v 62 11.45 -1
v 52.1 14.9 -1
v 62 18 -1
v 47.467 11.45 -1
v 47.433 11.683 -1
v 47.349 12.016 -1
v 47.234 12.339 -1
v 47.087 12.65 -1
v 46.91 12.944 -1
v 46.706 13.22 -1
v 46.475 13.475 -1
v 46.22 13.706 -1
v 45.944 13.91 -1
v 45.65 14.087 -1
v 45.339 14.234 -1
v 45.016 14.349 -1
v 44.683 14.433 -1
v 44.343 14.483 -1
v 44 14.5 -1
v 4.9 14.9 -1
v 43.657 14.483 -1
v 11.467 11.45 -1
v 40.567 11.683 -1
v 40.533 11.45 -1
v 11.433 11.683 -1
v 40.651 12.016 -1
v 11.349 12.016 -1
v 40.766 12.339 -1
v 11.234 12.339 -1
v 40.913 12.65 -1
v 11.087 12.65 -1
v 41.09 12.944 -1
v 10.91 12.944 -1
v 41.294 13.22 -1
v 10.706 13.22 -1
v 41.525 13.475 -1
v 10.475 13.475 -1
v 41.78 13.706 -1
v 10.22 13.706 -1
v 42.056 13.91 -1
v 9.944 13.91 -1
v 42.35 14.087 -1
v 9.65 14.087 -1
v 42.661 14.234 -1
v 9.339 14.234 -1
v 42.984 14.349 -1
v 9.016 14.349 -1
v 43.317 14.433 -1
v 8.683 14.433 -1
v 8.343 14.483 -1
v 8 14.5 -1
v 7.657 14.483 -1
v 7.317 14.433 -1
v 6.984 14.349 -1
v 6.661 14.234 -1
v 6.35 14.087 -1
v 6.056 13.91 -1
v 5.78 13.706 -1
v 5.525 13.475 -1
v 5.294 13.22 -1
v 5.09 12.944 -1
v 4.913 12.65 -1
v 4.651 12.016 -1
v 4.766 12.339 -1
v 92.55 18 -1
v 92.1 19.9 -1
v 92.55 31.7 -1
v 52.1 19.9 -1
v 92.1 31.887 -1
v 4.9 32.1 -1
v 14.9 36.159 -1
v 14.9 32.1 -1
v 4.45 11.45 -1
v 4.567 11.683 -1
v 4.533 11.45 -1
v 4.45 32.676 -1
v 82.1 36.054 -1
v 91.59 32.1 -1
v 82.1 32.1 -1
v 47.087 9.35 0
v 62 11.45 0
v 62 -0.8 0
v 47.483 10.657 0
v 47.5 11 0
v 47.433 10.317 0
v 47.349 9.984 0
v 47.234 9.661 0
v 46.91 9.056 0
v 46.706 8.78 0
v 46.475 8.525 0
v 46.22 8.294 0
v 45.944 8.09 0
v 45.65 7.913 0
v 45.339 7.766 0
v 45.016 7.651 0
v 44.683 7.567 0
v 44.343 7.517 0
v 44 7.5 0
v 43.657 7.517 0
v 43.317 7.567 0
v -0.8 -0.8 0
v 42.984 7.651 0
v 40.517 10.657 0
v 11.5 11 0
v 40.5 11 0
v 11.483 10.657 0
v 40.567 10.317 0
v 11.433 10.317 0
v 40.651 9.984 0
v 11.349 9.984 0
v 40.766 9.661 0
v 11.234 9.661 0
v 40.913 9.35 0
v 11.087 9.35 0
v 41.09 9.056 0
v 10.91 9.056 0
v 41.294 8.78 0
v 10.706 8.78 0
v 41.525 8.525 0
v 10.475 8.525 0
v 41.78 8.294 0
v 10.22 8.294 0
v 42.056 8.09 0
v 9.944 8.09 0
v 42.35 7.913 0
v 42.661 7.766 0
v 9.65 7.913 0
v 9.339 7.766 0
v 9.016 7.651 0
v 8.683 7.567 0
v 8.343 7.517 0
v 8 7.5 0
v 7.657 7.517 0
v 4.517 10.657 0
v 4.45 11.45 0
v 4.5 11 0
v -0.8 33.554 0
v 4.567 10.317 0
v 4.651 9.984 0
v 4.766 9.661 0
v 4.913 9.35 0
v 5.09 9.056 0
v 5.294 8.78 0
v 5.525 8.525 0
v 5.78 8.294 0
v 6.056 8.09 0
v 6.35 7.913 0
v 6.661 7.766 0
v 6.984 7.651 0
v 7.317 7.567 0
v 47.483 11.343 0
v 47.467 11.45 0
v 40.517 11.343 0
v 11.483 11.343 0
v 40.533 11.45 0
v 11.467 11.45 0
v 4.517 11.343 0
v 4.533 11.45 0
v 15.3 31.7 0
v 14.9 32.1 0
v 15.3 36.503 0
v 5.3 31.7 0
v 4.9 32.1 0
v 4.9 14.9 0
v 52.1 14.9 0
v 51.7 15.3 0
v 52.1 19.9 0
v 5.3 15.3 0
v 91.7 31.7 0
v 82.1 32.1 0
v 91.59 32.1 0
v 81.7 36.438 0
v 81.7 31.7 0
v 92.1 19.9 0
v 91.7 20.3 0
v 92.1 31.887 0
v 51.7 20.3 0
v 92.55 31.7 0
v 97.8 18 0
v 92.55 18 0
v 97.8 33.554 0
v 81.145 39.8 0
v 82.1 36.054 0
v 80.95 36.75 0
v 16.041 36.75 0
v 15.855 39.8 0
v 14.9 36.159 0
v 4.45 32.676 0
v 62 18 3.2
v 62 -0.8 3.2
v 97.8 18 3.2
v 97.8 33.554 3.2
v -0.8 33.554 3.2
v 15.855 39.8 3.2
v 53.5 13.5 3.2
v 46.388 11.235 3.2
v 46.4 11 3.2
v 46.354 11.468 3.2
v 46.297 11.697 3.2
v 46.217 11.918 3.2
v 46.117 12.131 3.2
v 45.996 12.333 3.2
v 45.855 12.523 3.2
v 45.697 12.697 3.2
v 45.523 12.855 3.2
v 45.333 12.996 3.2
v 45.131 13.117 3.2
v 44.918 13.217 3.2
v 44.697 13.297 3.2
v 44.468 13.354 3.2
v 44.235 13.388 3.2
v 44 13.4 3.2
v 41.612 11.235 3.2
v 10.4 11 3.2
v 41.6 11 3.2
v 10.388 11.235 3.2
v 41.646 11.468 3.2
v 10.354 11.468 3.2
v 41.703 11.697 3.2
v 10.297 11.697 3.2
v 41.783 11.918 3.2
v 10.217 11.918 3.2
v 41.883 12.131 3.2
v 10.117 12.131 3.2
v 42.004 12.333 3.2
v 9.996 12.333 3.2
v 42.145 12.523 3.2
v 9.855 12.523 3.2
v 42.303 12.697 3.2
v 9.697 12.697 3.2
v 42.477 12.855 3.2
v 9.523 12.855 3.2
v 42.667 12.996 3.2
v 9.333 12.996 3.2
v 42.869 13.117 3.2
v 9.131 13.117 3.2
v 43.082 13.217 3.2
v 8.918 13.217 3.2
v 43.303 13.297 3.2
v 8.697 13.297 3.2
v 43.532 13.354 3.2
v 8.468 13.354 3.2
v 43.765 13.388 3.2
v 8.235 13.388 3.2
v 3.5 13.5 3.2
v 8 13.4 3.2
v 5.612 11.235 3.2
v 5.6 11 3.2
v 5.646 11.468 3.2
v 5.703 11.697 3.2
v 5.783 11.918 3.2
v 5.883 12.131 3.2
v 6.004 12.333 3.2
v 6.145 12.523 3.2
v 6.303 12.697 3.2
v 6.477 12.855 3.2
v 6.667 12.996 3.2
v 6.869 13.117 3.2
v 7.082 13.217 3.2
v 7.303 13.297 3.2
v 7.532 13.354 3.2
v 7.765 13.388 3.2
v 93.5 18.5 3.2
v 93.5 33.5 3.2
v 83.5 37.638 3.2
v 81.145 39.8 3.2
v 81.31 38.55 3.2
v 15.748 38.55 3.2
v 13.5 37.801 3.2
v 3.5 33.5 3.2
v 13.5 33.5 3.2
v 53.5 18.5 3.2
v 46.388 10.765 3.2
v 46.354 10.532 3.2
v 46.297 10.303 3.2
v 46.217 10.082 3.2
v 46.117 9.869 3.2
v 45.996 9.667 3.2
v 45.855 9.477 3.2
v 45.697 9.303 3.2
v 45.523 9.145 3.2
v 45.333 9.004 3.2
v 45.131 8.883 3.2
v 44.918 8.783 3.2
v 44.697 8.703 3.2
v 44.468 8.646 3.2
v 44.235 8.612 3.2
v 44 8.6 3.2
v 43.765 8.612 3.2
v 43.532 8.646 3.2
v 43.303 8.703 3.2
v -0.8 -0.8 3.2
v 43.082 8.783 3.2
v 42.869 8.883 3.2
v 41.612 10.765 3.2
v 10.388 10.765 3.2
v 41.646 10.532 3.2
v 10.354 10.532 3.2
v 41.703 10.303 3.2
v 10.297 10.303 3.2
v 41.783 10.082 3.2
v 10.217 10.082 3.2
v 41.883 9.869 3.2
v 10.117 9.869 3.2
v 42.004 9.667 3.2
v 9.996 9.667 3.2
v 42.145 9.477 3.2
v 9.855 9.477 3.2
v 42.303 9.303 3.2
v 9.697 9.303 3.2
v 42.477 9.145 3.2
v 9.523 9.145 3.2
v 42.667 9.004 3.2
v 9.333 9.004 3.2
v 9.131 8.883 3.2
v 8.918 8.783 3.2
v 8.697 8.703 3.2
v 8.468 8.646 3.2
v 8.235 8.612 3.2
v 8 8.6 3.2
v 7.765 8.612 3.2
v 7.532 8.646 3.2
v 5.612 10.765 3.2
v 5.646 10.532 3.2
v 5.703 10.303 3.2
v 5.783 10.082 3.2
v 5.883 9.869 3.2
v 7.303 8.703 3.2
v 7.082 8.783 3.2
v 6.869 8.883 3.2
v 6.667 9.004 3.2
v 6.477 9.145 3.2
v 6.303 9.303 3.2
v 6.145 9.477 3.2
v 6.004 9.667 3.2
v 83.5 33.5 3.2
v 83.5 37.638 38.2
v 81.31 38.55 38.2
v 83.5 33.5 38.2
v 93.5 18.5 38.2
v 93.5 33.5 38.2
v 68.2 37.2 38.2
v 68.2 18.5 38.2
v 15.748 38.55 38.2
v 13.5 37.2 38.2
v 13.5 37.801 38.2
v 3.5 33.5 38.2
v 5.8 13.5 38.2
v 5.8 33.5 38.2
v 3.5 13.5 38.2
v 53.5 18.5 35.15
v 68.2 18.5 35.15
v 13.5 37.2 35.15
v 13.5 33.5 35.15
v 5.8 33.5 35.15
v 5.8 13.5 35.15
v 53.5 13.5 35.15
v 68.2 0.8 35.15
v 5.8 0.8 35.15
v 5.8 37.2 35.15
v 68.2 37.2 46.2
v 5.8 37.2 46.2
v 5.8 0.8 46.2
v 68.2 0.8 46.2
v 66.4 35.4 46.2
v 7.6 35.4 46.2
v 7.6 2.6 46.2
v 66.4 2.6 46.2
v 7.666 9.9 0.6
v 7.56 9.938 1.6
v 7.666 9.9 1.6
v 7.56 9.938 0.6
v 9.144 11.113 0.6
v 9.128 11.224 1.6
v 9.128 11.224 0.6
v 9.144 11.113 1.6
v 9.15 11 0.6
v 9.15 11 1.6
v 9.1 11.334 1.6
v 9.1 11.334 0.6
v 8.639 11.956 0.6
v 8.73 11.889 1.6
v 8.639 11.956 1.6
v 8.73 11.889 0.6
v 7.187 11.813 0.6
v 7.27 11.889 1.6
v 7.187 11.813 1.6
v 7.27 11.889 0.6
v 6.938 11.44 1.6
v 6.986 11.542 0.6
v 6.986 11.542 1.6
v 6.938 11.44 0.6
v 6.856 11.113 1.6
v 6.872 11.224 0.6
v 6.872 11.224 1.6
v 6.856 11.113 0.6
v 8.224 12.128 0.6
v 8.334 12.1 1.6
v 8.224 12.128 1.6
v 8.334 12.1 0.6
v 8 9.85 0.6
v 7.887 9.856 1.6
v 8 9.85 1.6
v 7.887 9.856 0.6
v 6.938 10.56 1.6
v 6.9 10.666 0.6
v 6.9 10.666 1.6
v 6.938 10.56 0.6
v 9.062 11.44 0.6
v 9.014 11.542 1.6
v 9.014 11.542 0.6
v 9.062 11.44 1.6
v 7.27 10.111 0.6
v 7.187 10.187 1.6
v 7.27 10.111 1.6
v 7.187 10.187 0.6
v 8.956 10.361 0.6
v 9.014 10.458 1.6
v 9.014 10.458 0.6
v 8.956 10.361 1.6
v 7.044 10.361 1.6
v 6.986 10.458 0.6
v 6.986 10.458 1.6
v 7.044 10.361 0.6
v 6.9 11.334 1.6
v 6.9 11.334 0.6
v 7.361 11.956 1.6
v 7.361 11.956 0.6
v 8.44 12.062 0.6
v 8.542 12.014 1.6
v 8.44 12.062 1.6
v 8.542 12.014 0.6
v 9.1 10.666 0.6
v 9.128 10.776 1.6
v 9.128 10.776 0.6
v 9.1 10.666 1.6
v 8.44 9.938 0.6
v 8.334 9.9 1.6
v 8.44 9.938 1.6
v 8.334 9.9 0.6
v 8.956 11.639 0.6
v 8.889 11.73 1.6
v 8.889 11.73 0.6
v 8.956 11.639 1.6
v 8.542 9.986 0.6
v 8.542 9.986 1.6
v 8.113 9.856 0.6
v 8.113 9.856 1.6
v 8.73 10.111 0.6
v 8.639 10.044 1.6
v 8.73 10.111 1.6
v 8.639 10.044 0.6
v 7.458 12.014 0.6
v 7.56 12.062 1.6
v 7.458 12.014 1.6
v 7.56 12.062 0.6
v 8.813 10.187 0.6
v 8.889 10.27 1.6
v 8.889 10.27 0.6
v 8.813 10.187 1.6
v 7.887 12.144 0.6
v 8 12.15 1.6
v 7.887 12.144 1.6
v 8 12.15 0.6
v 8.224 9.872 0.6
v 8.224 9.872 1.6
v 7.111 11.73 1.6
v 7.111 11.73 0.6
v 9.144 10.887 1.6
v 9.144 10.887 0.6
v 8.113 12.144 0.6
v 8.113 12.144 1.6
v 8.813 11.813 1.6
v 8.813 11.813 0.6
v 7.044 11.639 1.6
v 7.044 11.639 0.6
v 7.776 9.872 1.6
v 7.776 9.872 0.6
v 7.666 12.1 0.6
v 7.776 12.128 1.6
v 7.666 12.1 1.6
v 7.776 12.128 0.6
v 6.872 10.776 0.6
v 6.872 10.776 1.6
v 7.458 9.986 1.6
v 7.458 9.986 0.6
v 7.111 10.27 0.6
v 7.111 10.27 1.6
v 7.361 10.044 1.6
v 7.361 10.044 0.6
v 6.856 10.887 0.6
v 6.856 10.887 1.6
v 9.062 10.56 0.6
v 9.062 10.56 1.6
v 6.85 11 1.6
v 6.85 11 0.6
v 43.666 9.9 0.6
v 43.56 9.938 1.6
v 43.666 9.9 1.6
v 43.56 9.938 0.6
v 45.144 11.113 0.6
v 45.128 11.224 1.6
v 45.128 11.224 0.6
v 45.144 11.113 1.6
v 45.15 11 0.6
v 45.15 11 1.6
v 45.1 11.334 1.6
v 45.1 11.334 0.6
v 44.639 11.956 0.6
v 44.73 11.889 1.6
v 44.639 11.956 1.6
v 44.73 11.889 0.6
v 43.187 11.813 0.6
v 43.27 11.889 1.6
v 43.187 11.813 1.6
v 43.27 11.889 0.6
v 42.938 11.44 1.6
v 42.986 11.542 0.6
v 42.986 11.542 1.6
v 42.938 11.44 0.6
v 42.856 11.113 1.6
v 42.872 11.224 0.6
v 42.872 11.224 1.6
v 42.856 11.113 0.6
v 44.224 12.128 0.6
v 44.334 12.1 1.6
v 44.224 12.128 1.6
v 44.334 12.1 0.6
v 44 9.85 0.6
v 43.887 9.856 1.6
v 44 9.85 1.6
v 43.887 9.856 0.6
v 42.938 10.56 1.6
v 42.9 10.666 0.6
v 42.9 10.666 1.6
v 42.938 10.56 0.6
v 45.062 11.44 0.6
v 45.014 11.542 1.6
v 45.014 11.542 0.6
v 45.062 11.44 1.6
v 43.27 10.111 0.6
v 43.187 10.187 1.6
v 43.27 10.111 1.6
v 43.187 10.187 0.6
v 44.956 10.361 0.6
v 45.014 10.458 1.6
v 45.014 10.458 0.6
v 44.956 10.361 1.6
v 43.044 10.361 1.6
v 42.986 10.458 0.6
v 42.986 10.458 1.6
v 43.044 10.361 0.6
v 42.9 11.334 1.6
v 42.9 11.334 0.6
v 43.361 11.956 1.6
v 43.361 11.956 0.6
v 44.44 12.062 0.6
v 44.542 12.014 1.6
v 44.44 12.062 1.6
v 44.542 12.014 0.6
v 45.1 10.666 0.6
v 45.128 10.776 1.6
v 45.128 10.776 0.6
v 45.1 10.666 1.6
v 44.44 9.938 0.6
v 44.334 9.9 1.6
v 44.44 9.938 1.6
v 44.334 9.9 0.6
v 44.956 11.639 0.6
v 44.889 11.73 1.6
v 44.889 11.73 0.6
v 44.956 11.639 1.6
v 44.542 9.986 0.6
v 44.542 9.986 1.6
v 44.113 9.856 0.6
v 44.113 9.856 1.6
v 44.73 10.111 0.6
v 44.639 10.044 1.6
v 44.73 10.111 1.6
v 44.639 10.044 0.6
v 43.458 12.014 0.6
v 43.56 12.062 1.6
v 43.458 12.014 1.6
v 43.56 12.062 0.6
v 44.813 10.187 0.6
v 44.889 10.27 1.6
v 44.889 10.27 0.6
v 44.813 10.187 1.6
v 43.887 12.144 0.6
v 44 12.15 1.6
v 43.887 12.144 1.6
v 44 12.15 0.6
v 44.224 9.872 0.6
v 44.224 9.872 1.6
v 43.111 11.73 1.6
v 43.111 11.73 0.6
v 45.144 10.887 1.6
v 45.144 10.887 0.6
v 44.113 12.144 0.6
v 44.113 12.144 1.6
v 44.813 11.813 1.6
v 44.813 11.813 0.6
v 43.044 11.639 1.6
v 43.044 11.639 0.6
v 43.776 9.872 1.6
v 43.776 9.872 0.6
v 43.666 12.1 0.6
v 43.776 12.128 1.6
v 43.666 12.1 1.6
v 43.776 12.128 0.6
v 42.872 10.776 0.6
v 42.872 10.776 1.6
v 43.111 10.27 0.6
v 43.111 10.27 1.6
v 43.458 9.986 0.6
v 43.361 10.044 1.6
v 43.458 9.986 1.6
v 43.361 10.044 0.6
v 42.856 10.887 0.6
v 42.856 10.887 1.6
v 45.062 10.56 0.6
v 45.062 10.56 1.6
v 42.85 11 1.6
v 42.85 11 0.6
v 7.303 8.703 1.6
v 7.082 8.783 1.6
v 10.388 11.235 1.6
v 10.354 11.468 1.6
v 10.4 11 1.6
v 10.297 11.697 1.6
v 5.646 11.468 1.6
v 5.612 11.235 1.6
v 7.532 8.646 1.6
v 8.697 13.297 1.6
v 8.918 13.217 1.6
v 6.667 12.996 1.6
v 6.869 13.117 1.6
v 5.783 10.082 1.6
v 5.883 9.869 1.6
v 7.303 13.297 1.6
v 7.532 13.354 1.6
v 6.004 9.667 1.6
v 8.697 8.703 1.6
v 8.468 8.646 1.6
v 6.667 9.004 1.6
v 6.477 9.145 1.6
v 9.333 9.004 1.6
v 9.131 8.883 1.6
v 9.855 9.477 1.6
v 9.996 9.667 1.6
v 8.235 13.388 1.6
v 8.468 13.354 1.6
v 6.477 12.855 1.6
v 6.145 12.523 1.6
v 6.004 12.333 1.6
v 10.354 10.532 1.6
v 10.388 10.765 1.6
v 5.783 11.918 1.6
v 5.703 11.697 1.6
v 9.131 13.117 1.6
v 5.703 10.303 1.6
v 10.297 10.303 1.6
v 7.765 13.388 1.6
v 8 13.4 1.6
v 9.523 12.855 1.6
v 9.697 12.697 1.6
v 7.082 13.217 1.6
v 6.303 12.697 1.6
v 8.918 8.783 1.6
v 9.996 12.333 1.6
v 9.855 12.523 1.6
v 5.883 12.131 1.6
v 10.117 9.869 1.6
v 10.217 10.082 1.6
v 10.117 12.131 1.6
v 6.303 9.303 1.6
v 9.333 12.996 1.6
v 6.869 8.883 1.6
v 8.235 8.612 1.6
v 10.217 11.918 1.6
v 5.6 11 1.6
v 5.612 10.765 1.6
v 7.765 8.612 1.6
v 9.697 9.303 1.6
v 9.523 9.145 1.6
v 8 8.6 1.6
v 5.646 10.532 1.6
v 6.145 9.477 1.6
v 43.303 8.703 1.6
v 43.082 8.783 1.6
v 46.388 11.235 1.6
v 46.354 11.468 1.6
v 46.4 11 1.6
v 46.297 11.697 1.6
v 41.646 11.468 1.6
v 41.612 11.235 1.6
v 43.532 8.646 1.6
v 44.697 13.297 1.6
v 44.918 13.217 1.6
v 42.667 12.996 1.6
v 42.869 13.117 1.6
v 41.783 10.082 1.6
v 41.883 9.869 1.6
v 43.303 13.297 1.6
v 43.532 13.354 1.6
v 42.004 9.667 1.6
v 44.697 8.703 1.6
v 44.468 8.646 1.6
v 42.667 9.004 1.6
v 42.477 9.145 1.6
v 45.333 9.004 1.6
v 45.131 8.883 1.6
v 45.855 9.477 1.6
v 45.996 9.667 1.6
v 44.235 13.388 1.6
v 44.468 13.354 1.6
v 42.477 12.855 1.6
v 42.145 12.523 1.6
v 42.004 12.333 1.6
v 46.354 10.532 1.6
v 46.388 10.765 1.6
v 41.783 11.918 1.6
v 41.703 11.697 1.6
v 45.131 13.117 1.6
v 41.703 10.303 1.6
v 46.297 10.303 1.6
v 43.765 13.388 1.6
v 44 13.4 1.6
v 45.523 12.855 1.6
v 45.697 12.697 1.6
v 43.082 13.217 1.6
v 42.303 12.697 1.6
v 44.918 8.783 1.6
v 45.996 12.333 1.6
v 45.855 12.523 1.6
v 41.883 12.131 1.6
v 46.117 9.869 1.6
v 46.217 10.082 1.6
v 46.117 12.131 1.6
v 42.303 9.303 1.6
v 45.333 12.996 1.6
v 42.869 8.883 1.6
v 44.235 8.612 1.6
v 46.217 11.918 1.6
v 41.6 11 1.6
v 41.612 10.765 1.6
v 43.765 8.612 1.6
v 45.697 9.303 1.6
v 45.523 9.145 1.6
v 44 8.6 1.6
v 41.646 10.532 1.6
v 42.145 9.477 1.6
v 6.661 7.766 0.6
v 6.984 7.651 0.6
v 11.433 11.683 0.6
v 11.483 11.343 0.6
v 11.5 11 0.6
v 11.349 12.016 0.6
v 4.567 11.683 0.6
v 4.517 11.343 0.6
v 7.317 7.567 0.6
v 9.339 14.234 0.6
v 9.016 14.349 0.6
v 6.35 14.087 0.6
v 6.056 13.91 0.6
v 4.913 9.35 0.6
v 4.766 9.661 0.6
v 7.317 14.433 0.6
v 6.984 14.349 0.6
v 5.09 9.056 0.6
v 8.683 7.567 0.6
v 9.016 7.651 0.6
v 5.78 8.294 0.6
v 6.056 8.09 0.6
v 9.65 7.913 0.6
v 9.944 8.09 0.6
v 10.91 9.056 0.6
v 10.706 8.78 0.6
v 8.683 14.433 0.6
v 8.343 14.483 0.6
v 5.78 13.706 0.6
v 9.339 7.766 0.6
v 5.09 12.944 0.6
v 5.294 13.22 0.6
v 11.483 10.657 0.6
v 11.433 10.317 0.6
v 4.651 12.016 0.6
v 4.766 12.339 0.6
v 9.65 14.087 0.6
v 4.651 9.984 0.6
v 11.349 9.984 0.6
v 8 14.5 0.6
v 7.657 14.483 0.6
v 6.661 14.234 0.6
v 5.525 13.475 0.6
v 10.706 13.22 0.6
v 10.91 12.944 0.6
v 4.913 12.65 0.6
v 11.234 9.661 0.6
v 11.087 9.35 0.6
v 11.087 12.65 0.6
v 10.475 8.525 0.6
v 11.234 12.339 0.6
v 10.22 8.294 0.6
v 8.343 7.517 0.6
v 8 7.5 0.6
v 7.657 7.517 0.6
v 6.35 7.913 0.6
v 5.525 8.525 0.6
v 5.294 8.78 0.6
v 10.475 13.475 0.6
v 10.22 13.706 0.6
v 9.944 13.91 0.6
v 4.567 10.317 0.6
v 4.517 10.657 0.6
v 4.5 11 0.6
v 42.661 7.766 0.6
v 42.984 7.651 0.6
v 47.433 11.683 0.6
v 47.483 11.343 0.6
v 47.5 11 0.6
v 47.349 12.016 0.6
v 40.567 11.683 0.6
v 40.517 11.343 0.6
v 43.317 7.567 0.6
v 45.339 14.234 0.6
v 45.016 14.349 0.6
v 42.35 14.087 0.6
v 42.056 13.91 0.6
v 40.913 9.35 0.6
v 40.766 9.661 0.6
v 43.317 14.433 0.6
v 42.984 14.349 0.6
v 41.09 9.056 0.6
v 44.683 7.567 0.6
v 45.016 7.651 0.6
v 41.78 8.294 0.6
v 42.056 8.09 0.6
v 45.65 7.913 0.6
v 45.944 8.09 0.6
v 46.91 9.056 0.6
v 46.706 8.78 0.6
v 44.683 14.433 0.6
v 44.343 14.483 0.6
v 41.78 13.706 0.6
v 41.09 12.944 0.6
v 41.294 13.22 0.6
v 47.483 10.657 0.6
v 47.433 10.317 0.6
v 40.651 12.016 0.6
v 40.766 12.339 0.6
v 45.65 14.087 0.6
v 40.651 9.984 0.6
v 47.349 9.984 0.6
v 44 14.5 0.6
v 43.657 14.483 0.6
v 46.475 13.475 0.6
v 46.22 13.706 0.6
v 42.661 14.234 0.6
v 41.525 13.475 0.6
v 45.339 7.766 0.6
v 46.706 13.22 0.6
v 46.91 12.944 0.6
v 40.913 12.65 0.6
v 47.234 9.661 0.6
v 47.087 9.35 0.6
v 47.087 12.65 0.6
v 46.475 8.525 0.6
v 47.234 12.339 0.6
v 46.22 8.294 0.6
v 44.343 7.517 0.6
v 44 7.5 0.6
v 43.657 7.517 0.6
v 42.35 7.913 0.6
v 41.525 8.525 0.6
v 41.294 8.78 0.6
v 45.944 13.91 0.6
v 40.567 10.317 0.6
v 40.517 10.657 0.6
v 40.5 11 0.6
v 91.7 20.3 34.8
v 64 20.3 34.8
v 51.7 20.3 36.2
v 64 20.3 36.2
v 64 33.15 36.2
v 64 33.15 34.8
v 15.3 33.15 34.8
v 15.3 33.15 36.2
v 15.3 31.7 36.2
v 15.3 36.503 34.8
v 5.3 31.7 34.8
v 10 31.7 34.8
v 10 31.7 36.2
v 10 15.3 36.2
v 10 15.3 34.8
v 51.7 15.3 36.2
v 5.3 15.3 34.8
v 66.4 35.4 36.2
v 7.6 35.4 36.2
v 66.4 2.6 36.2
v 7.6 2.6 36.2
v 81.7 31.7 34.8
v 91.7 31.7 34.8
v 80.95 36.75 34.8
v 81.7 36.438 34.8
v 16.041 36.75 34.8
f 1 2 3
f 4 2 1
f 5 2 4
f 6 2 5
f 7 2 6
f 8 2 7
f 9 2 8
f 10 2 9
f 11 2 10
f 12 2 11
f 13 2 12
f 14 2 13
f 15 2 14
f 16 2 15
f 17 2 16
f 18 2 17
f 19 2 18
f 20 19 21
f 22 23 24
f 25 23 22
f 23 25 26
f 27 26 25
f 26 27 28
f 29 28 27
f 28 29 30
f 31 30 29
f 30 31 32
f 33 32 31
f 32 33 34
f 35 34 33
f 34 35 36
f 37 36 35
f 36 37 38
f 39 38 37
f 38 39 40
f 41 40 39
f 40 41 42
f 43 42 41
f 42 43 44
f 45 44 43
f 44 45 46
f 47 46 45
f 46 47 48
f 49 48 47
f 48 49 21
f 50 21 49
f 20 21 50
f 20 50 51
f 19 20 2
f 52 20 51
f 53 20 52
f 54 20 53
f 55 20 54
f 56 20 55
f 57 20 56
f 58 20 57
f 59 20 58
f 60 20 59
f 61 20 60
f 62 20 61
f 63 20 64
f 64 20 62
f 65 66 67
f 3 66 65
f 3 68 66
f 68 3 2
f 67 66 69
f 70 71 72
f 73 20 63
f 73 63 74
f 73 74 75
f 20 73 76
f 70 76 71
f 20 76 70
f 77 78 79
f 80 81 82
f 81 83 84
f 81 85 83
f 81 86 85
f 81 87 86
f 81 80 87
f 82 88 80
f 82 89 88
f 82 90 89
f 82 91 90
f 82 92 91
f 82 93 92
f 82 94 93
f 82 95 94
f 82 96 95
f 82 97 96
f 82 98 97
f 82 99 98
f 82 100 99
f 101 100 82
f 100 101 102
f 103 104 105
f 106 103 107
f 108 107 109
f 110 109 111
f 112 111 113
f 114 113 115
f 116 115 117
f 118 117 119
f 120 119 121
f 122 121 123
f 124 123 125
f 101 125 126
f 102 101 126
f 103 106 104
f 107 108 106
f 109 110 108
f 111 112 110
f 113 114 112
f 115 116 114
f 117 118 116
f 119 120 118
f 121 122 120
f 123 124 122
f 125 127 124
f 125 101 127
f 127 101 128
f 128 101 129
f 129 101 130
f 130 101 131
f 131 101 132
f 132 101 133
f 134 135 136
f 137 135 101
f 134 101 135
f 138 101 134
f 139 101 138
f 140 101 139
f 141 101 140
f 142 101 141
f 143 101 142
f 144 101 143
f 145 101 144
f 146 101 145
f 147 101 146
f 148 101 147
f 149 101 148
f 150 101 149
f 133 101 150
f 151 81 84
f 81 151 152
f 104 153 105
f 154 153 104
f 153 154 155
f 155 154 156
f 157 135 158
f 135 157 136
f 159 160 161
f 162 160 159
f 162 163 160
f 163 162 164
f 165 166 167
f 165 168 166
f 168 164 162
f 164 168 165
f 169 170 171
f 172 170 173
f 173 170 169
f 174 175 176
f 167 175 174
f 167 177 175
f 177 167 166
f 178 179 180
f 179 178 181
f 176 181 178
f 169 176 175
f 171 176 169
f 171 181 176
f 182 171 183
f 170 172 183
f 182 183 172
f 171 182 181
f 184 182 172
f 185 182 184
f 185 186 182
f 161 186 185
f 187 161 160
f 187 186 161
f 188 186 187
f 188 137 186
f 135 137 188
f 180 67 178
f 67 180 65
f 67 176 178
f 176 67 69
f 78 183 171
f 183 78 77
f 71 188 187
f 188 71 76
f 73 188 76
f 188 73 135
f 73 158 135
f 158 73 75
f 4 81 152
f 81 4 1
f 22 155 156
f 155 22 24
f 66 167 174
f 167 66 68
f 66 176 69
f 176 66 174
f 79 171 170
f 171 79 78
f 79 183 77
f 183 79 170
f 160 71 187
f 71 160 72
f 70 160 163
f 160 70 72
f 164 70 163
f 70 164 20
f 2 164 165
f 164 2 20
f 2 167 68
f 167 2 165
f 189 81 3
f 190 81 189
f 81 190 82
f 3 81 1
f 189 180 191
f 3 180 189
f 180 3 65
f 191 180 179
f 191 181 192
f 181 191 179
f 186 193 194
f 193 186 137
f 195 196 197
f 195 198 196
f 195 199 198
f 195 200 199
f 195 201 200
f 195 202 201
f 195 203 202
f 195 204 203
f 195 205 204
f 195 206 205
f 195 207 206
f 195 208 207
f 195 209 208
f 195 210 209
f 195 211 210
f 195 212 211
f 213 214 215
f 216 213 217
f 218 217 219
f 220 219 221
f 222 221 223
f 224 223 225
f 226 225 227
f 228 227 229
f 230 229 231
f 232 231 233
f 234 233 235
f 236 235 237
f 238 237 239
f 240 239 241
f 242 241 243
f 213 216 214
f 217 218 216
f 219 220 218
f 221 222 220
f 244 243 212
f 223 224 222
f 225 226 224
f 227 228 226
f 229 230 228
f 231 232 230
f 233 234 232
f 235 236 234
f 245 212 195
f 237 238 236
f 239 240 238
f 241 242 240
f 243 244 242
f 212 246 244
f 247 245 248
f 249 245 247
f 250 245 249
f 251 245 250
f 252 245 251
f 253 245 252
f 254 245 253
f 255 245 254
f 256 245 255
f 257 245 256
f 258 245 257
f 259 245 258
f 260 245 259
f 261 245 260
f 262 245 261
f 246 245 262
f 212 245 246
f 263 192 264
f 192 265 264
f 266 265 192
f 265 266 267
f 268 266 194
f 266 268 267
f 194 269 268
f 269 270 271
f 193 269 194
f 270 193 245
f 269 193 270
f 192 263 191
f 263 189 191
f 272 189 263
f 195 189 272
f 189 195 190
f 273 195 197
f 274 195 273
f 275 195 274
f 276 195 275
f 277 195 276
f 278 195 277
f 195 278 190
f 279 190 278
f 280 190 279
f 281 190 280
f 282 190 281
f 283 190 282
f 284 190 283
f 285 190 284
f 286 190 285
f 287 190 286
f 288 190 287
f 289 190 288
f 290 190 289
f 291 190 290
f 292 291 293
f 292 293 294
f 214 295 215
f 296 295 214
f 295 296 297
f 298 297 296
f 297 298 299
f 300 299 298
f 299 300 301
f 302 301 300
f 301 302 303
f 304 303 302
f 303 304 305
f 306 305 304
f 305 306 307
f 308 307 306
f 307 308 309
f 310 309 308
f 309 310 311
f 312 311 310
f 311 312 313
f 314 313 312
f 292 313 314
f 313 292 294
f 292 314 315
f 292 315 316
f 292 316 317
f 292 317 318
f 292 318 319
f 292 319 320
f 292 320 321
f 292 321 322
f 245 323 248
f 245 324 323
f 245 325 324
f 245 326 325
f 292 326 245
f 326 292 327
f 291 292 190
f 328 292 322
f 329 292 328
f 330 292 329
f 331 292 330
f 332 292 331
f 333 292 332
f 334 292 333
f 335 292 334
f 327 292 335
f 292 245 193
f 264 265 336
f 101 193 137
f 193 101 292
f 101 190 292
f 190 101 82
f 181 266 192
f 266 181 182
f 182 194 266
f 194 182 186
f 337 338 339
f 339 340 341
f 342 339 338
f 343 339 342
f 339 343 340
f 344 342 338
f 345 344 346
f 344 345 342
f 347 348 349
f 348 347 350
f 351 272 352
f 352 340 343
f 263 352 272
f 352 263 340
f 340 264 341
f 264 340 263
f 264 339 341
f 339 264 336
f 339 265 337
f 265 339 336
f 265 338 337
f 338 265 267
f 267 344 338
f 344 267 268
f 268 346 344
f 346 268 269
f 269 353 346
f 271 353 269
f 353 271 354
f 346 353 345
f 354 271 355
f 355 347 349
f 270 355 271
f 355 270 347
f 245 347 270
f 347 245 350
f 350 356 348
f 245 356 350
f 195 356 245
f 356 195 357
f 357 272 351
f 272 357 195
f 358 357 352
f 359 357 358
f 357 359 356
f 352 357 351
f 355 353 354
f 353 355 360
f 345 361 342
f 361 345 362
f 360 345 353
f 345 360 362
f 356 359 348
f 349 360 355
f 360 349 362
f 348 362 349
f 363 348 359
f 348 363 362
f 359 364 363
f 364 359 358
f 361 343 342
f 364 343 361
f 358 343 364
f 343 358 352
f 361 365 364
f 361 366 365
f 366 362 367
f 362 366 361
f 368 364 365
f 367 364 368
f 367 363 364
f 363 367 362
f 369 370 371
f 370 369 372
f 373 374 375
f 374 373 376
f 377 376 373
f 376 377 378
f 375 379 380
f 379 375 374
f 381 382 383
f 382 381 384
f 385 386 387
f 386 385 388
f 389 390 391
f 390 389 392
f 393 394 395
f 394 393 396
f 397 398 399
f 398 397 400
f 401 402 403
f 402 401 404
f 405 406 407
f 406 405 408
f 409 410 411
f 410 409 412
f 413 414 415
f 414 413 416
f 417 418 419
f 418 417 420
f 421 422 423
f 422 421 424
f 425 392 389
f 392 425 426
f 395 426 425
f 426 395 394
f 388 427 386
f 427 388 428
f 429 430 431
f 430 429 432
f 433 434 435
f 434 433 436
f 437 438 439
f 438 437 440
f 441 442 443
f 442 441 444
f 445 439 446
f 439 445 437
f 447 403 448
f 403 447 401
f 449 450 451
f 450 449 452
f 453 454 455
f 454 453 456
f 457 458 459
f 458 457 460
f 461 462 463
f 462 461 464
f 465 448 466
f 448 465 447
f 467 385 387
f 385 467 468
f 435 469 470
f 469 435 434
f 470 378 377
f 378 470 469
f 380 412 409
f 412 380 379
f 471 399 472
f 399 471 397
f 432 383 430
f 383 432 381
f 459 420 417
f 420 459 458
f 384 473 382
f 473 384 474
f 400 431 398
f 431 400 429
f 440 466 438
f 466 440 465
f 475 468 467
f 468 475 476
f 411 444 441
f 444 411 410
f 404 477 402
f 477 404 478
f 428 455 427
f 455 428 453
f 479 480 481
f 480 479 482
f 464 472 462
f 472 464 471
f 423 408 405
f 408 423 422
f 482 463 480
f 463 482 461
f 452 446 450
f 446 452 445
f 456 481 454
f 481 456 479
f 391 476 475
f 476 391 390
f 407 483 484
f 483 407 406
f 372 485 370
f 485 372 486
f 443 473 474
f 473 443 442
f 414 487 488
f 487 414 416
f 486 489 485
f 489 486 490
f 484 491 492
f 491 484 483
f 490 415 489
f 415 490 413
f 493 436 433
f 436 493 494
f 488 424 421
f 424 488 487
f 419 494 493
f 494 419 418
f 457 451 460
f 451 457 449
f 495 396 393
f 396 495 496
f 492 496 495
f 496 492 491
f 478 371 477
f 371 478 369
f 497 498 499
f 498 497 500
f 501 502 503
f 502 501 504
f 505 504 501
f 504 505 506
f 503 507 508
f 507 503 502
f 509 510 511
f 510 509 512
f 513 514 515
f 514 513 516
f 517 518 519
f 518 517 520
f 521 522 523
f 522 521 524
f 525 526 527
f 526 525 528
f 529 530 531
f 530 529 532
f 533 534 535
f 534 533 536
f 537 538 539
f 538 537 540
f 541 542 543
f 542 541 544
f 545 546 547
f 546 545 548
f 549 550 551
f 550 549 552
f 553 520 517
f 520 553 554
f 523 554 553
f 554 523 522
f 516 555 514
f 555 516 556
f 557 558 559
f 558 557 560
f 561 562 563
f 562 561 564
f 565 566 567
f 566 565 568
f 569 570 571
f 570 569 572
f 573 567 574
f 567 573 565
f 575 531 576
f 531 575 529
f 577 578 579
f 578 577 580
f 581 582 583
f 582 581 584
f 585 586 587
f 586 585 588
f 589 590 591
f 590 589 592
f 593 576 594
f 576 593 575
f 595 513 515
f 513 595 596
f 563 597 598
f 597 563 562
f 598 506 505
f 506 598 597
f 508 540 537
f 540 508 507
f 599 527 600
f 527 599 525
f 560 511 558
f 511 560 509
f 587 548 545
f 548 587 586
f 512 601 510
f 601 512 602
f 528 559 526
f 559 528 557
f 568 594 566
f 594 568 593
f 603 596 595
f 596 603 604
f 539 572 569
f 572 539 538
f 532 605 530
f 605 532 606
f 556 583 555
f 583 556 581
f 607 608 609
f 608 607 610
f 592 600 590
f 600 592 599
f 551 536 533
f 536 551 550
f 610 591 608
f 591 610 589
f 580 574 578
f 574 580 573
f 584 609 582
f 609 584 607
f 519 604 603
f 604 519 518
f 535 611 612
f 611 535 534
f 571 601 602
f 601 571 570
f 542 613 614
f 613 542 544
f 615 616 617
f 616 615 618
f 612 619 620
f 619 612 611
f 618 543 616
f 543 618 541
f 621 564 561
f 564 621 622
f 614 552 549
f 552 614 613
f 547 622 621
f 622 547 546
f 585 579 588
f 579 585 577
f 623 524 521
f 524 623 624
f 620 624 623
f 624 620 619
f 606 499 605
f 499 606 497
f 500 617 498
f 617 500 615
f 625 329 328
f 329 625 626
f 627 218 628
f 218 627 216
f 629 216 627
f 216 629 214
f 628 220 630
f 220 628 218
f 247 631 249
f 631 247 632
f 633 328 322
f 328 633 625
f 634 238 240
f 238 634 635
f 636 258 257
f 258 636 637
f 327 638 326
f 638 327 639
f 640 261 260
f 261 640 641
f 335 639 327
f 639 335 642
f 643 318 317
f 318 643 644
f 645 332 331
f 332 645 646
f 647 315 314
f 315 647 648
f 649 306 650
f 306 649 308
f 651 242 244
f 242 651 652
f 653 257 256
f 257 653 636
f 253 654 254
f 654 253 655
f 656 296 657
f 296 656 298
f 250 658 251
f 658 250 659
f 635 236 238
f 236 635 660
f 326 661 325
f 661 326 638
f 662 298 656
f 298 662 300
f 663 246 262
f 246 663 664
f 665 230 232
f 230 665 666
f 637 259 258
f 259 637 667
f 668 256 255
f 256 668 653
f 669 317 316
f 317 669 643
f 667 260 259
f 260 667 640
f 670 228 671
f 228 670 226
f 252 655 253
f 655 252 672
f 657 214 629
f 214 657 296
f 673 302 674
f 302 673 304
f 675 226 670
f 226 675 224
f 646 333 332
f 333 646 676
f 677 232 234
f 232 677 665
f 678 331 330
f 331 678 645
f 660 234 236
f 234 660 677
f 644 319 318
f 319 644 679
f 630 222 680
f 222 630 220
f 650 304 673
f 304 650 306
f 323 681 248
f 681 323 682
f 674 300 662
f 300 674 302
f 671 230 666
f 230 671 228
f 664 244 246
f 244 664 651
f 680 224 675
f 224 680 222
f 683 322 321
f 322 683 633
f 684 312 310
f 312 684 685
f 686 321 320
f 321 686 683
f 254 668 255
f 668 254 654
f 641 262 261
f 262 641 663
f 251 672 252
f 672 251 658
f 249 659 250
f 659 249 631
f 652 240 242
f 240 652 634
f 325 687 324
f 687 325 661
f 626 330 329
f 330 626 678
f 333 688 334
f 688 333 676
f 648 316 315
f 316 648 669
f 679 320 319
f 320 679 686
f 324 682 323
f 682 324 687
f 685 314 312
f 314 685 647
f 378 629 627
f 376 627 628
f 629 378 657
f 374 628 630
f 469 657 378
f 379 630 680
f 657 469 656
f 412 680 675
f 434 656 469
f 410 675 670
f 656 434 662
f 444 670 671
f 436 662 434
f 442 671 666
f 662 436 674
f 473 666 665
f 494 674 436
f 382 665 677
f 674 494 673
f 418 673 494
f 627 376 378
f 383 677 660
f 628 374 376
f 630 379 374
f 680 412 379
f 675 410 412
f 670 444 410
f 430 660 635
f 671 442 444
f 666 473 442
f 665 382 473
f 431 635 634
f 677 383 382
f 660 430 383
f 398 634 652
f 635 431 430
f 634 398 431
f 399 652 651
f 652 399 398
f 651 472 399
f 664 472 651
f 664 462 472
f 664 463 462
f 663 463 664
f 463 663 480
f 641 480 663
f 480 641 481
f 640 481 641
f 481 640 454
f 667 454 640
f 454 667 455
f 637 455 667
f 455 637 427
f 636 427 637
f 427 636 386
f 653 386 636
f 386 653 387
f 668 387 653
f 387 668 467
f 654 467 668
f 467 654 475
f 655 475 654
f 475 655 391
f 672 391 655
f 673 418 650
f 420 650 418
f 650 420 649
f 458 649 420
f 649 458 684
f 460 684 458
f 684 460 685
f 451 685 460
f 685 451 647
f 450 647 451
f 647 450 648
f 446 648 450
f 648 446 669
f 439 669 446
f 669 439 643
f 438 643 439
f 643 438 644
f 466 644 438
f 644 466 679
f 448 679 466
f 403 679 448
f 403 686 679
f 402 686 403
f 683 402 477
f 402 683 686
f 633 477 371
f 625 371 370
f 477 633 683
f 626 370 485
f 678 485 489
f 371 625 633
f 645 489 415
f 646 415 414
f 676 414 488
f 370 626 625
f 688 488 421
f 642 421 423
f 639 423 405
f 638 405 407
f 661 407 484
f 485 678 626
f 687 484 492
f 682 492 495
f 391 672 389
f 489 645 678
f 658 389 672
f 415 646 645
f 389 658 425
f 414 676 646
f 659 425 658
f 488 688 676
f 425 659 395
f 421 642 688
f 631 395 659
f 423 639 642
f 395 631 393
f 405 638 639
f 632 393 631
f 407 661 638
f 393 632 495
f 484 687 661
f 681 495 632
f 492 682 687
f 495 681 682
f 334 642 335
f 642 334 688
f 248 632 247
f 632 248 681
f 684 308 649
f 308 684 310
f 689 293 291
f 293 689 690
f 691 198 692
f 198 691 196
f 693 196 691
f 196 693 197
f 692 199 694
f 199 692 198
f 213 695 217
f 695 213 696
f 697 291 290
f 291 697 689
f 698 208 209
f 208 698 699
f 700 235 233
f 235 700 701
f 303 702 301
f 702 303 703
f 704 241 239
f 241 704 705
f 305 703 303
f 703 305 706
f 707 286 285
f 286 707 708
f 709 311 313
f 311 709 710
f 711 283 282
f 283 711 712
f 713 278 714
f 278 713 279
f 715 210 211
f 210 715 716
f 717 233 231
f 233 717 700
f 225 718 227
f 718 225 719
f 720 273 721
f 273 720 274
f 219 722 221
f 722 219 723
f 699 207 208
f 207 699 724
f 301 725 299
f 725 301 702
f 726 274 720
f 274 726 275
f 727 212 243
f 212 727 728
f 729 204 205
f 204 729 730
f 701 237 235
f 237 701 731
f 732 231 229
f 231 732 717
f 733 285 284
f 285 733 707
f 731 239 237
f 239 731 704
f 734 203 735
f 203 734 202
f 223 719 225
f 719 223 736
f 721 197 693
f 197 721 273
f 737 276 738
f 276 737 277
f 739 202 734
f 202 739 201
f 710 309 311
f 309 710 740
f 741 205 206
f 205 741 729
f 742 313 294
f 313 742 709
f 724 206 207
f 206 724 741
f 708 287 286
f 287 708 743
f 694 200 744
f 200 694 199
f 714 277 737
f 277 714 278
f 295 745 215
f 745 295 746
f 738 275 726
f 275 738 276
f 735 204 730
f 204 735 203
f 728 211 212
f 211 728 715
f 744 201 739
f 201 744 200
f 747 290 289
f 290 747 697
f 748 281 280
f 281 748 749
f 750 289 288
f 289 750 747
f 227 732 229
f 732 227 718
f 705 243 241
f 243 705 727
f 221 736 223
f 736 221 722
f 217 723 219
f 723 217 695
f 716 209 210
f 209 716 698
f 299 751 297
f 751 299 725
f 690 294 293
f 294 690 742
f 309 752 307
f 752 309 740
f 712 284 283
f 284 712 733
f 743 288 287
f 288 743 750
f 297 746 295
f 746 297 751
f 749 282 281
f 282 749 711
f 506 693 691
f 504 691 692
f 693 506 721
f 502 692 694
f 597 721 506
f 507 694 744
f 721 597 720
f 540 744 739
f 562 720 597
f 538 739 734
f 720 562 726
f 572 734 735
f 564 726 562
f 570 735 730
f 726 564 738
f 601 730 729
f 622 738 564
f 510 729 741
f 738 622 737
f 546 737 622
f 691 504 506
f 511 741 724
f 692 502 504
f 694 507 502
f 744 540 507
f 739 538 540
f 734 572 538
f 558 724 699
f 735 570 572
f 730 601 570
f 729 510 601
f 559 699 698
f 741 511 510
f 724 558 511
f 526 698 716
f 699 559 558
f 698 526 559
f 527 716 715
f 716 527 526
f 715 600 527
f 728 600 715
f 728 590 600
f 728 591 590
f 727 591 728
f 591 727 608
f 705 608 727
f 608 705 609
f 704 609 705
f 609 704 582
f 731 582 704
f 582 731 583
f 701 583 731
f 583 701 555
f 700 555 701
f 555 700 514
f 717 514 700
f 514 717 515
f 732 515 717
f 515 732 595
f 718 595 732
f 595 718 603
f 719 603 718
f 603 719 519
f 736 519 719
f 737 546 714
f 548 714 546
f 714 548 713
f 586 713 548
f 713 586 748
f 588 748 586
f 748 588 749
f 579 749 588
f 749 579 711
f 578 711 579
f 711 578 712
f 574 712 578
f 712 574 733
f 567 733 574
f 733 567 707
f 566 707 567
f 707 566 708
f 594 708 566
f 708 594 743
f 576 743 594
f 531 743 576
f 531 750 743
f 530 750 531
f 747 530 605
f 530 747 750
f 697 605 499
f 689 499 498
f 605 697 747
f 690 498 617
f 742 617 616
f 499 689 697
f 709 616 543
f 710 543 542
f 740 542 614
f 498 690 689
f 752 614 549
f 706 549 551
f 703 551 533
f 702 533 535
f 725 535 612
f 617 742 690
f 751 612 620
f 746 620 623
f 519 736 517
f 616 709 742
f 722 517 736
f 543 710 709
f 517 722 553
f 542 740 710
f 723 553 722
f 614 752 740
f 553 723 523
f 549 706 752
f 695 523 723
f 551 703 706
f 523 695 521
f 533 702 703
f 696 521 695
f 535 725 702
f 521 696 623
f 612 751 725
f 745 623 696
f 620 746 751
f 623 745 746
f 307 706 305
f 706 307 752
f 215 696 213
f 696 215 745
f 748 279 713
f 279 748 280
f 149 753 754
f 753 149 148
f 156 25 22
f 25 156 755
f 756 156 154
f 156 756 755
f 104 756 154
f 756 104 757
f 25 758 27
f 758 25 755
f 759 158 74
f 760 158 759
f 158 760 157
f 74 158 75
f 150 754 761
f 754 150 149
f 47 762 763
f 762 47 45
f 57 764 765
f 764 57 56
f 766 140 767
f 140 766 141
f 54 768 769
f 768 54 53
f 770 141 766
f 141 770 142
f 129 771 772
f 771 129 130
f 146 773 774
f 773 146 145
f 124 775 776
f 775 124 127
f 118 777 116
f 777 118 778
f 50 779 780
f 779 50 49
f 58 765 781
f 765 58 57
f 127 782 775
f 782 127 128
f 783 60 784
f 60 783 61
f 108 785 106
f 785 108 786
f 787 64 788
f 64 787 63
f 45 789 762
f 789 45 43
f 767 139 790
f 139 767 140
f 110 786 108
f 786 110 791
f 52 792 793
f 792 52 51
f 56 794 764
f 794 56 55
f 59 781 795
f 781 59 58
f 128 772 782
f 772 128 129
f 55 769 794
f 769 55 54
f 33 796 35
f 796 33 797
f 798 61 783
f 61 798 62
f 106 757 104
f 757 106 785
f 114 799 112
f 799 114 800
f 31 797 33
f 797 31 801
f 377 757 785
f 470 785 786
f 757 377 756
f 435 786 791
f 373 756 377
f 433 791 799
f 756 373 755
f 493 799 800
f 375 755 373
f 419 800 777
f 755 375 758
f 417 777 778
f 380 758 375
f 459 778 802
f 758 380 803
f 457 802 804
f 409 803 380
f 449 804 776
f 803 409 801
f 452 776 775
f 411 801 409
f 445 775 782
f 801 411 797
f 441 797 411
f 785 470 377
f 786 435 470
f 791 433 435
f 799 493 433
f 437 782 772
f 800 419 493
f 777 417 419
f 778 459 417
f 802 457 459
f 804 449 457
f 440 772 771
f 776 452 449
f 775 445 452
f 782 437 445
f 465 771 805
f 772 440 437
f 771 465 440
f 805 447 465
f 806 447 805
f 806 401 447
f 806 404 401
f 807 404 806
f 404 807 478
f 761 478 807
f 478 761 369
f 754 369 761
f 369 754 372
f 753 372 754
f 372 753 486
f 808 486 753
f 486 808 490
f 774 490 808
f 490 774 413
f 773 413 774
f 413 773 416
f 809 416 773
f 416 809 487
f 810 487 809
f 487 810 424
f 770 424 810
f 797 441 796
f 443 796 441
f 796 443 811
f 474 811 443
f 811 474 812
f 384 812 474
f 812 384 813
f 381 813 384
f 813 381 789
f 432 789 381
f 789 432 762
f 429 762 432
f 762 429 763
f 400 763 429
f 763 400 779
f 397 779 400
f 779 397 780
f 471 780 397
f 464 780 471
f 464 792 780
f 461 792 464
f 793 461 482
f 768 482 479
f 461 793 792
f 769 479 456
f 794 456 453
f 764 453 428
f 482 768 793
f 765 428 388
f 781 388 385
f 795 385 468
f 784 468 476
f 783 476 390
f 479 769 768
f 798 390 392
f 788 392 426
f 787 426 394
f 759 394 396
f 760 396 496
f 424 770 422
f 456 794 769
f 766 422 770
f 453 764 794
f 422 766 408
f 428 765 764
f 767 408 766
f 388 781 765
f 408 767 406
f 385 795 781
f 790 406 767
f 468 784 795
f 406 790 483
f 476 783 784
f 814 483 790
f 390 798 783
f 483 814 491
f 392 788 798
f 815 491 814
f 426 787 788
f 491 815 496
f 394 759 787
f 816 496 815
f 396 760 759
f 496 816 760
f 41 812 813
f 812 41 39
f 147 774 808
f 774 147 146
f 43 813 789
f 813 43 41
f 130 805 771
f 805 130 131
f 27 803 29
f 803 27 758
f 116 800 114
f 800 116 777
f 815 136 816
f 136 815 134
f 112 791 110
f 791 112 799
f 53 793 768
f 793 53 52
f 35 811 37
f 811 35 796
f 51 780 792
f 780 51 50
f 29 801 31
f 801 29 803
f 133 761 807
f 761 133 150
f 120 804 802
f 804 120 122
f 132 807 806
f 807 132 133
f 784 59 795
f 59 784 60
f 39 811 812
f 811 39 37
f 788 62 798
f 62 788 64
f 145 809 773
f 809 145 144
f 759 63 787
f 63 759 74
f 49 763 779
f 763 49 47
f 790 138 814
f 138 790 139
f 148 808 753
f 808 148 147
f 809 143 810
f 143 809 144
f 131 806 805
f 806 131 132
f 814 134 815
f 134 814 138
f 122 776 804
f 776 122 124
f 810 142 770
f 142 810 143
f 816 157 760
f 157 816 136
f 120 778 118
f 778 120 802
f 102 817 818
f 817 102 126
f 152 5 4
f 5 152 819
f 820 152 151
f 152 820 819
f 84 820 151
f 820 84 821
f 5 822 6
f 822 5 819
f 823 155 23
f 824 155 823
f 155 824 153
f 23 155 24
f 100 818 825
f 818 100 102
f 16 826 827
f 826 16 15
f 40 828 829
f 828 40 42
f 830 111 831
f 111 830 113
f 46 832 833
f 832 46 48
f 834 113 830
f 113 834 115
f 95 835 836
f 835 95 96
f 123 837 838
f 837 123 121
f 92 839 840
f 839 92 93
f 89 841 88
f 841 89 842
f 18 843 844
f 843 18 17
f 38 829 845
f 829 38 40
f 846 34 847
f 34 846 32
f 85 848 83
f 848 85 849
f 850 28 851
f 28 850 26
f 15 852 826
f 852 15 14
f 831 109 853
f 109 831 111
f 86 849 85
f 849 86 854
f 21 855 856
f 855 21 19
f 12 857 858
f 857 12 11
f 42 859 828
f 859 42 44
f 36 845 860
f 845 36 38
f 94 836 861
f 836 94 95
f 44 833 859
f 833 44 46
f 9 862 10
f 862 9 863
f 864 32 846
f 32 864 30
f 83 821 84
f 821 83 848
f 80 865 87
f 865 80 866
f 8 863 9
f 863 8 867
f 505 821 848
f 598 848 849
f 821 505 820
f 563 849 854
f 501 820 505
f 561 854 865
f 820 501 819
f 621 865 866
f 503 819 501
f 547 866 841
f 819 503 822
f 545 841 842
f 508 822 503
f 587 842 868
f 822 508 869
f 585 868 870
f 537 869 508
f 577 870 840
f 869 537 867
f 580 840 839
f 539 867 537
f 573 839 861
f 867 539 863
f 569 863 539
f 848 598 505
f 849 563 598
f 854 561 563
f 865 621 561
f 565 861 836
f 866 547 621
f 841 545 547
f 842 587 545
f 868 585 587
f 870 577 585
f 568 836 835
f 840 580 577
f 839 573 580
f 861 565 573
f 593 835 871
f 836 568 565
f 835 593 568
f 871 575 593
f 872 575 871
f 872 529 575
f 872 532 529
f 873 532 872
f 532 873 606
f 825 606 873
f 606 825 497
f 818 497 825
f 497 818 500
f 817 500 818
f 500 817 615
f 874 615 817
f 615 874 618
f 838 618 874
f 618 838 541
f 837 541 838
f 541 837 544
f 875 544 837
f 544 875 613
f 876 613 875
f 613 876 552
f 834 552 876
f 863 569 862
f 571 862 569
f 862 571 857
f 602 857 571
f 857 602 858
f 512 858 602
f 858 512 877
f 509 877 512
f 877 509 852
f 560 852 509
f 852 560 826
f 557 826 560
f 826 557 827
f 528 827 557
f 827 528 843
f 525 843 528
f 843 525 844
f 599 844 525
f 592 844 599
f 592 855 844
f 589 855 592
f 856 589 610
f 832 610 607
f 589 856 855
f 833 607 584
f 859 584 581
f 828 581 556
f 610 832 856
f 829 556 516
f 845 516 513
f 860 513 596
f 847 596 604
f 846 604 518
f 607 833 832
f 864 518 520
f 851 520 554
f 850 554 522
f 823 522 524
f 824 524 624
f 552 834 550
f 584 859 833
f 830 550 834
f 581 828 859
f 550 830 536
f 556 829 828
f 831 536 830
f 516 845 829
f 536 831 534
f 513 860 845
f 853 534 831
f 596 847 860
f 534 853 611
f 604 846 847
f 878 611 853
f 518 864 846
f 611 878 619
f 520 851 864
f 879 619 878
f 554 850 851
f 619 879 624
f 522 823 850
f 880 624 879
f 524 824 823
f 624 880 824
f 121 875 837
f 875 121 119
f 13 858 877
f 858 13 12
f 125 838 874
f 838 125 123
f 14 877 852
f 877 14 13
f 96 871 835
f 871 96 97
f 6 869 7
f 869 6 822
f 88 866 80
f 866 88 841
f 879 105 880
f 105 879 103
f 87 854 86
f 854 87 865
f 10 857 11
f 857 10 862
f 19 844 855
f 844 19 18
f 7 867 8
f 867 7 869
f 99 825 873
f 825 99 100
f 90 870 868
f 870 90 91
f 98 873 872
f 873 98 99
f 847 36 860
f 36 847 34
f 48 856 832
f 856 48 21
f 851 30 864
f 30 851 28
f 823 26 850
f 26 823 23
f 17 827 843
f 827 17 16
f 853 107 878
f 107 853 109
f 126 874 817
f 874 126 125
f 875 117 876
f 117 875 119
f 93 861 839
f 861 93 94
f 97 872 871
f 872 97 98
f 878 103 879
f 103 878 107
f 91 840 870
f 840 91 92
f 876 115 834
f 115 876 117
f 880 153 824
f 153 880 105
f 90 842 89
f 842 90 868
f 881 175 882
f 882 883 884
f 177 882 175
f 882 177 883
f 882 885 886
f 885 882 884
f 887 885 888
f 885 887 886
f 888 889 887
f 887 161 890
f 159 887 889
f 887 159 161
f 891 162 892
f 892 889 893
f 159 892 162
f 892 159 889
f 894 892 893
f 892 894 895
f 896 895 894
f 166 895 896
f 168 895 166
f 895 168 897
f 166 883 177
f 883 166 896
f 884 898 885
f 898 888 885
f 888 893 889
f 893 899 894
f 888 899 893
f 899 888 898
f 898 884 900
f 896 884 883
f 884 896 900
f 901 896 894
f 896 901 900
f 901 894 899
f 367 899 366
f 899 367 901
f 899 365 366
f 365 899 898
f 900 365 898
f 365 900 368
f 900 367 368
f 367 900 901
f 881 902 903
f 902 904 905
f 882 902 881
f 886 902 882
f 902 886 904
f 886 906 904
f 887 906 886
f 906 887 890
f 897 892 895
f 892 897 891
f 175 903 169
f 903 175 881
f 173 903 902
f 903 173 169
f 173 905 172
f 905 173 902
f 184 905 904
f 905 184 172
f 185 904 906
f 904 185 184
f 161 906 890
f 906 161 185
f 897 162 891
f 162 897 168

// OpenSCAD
// K200 rear blower shroud
// Card XY from measurement_canvas.js. +Z is off the 8-pin end, into the
// 170 x 100 mm case pocket (keep the Arctic front fans).
//
// Fan: Delta BFB1012VH. Drawing 97.2 x 94.4 x 33; measured snout 58 x 32.
// Outlet faces -Z into the cap, so 97.2 (blow + snail) is our Z and 94.4 is X.
// Duct is a straight extrusion of the heatsink window. No hull.
//
// PART: "flange" | "shroud" | "preview"

$fn = 64;
PART = "shroud";

eps        = 0.05;
wall       = 1.8;
flange_z   = 3.2;
hs_clear   = 0.7;
outer_grow = 0.8;
m2_d       = 2.3;
m2_head_d  = 4.8;
m2_head_z  = 1.6;
m2_boss_d  = 7.0;   // Ø4 mm pad; Ø5 was tight on the second flange print
m2_boss_z  = 0.6;   // into the flange from the card face
cable_z    = 32.0;  // match CASE.cable_run_z
cap_z      = 3.0;

// Straight HS duct through the cable run. Blower starts after the braid turns.
plenum_z   = cable_z;

// Intake face is 97.2 x 94.4. Blow is along 97.2 (= our Z); 94.4 fits in X.
blower_x   = 0.0;
blower_y   = 3.0;
blower_w   = 94.4;
blower_h   = 32.0;  // measured pack / snout; drawing is 33.0±0.5
blower_len = 97.2;

// Snout face, calipered 2026-09-20: 58 x 32 outer (drawing 57.9±0.5 x 33.0±0.5).
// Inner still from drawing wall stock (2.0 / 1.85); through-hole is ∩ HS window.
// Plan-view 50.0±0.5 is boxed snout depth along 97.2 (our Z), not the hole.
snout_w        = 58.0;
snout_h        = 32.0;
snout_inner_w  = 54.0;
snout_inner_h  = 28.3;
snout_stick    = 13.0;  // measured: grill face to snail body
snout_register = 2.0;   // plug depth into the cap (dead-ends below the HS)
snout_collar_z = snout_stick - snout_register - 3.0; // 8 mm tube; ~3 mm gap to snail
snout_x        = 8.0;   // over the wide HS band; flip 180° about Y for the other side
snout_y        = blower_y;
snout_clear    = 0.4;
snout_box_z    = 50.0;  // drawing: rectangular housing along the blow axis

outer_pts = [
    [0, 0], [97, 0], [97, 33], [81, 39], [16, 39], [0, 33]
];
hs_pts = [
    [16, 36.5], [81, 36.5], [81, 31], [91, 31], [91, 21],
    [51, 21], [51, 16], [6, 16], [6, 31], [16, 31]
];
inner_pts = [
    [16, 37], [81, 37], [93, 32], [93, 15], [88, 15], [88, 17],
    [65, 17], [65, 11], [4, 11], [4, 33]
];
screws = [[8, 11], [44, 11]];

module profile_outer() polygon(outer_pts);
module profile_inner() polygon(inner_pts);
module profile_hs() polygon(hs_pts);

module pin8_2d() {
    translate([62, -4]) square([50, 22]);
}

module hs_window() {
    intersection() {
        offset(delta=hs_clear) profile_hs();
        offset(delta=-0.25) profile_inner();
    }
}

module snout_outer_2d() {
    translate([snout_x - snout_clear, snout_y - snout_clear])
        square([snout_w + 2 * snout_clear, snout_h + 2 * snout_clear]);
}

module snout_inner_2d() {
    translate([
        snout_x + (snout_w - snout_inner_w) / 2,
        snout_y + (snout_h - snout_inner_h) / 2
    ]) square([snout_inner_w, snout_inner_h]);
}

module snout_air() {
    // Through the cap only where the snout overlaps the plenum — never the cable bay.
    intersection() {
        snout_inner_2d();
        hs_window();
    }
}

module blower_2d() {
    // Walls in Y only. 94.4 mm along X already fills the card.
    translate([blower_x, blower_y - wall])
        square([blower_w, blower_h + 2 * wall]);
}

module screw_through() {
    for (p = screws)
        translate([p[0], p[1], -2]) cylinder(d=m2_d, h=flange_z + 4);
}

module screw_counterbore() {
    for (p = screws)
        translate([p[0], p[1], flange_z - m2_head_z])
            cylinder(d=m2_head_d, h=m2_head_z + 0.4);
}

module screw_boss_clearance() {
    // Card-facing pockets for the Ø4 mm metal pads around the M2 holes.
    for (p = screws)
        translate([p[0], p[1], -1.2])
            cylinder(d=m2_boss_d, h=1.2 + m2_boss_z);
}

module locator_solid() {
    translate([0, 0, -1.0])
        difference() {
            linear_extrude(1.0) offset(delta=-0.45) profile_inner();
            linear_extrude(1.2) offset(delta=hs_clear + 0.4) profile_hs();
            linear_extrude(1.2) pin8_2d();
        }
}

module flange_plate() {
    linear_extrude(flange_z) offset(delta=outer_grow) profile_outer();
}

module pin8_cut() {
    translate([0, 0, -2]) linear_extrude(flange_z + 2) pin8_2d();
}

module hs_cavity() {
    // One hole through flange + duct. Stops short of the cap so the cap can close.
    translate([0, 0, -eps])
        linear_extrude(flange_z + plenum_z - 0.4 + eps)
            hs_window();
}

module duct_outer() {
    translate([0, 0, flange_z - eps])
        linear_extrude(plenum_z + cap_z + eps)
            offset(delta=wall) hs_window();
}

module end_cap() {
    z0 = flange_z + plenum_z;
    // Solid lid over the HS tube + a pad for the 32 mm snout (taller than the fins).
    translate([0, 0, z0 - eps])
        linear_extrude(cap_z + eps)
            union() {
                offset(delta=wall) hs_window();
                offset(delta=wall) snout_outer_2d();
            }
}

module snout_collar() {
    // Tube on the fan side of the cap. Snout slides in; snail stays ~3 mm off the rim.
    z0 = flange_z + plenum_z;
    translate([0, 0, z0 + cap_z - eps])
        linear_extrude(snout_collar_z + eps)
            offset(delta=wall) snout_outer_2d();
}

module fan_cuts() {
    z0 = flange_z + plenum_z;
    translate([0, 0, z0 - 1])
        linear_extrude(cap_z + snout_collar_z + 8)
            snout_air();
    // 58×32 plug through the collar and 2 mm into the cap; dead-ends below the HS.
    translate([0, 0, z0 + cap_z - snout_register])
        linear_extrude(snout_register + snout_collar_z + 0.4)
            snout_outer_2d();
}

module flange() {
    difference() {
        union() {
            flange_plate();
            locator_solid();
        }
        translate([0, 0, -eps]) linear_extrude(flange_z + 2 * eps) hs_window();
        pin8_cut();
        screw_through();
        screw_counterbore();
        screw_boss_clearance();
    }
}

module shroud() {
    difference() {
        union() {
            flange_plate();
            locator_solid();
            duct_outer();
            end_cap();
            snout_collar();
        }
        hs_cavity();
        pin8_cut();
        screw_through();
        screw_counterbore();
        screw_boss_clearance();
        fan_cuts();
    }
}

module snail_xz() {
    // 2D in XZ: y=0 is the snout face (toward the card), +y is +Z into the scroll.
    // Volute like the BFB1012 photo: round body, snout off to one side — not a box.
    cx = snout_x + snout_w / 2 + 8;
    cz = snout_box_z;
    difference() {
        intersection() {
            translate([blower_x, 0]) square([blower_w, blower_len]);
            union() {
                hull() {
                    translate([cx, cz]) circle(d=88);
                    translate([snout_x, 3]) square([snout_w, 8]);
                }
                translate([snout_x, -snout_stick])
                    square([snout_w, snout_stick + 10]);
            }
        }
        translate([cx, cz]) circle(d=74);
        translate([
            snout_x + (snout_w - snout_inner_w) / 2,
            -snout_stick - 1
        ]) square([snout_inner_w, snout_stick + 18]);
    }
}

module preview_blower() {
    // BFB1012VH snail. 32 mm in Y (slot). Intake is the round face (±Y).
    // Snout points -Z into the cap. Look from +Y to see the snail; from +Z
    // you only see the 32 mm edge and the 58×32 mouth (orange frame).
    z_cap    = flange_z + plenum_z;
    // Grill sits in the 2 mm cap register; snail is snout_stick behind that face.
    snout_z0 = z_cap + cap_z - snout_register + snout_stick;

    color([0.18, 0.18, 0.22, 0.72])
        translate([0, blower_y + blower_h, snout_z0])
            rotate([90, 0, 0])
                linear_extrude(blower_h, convexity=10)
                    snail_xz();

    // Mouth frame — 58×32 register; through-hole is only the overlap with the HS.
    color([0.85, 0.35, 0.1, 0.9])
        translate([snout_x, snout_y, z_cap])
            difference() {
                cube([snout_w, snout_h, 1.2]);
                translate([0, 0, -0.2])
                    linear_extrude(2) snout_air();
            }
}

module preview_envelope() {
    color([0.2, 0.6, 0.3, 0.12])
        translate([-1.5, 0, 0]) cube([100, 39, 170]);
}

module preview_card() {
    color([0.45, 0.45, 0.5, 0.3]) linear_extrude(0.4) profile_outer();
    color([0.85, 0.15, 0.1, 0.4])
        translate([0, 0, 0.4]) linear_extrude(0.4) profile_hs();
    color([0.1, 0.1, 0.1])
        for (p = screws) translate([p[0], p[1], -0.2]) cylinder(d=2, h=1);
}

if (PART == "flange") {
    flange();
} else if (PART == "preview") {
    preview_envelope();
    preview_card();
    color([0.15, 0.5, 0.85, 0.75]) shroud();
    preview_blower();
} else {
    shroud();
}
